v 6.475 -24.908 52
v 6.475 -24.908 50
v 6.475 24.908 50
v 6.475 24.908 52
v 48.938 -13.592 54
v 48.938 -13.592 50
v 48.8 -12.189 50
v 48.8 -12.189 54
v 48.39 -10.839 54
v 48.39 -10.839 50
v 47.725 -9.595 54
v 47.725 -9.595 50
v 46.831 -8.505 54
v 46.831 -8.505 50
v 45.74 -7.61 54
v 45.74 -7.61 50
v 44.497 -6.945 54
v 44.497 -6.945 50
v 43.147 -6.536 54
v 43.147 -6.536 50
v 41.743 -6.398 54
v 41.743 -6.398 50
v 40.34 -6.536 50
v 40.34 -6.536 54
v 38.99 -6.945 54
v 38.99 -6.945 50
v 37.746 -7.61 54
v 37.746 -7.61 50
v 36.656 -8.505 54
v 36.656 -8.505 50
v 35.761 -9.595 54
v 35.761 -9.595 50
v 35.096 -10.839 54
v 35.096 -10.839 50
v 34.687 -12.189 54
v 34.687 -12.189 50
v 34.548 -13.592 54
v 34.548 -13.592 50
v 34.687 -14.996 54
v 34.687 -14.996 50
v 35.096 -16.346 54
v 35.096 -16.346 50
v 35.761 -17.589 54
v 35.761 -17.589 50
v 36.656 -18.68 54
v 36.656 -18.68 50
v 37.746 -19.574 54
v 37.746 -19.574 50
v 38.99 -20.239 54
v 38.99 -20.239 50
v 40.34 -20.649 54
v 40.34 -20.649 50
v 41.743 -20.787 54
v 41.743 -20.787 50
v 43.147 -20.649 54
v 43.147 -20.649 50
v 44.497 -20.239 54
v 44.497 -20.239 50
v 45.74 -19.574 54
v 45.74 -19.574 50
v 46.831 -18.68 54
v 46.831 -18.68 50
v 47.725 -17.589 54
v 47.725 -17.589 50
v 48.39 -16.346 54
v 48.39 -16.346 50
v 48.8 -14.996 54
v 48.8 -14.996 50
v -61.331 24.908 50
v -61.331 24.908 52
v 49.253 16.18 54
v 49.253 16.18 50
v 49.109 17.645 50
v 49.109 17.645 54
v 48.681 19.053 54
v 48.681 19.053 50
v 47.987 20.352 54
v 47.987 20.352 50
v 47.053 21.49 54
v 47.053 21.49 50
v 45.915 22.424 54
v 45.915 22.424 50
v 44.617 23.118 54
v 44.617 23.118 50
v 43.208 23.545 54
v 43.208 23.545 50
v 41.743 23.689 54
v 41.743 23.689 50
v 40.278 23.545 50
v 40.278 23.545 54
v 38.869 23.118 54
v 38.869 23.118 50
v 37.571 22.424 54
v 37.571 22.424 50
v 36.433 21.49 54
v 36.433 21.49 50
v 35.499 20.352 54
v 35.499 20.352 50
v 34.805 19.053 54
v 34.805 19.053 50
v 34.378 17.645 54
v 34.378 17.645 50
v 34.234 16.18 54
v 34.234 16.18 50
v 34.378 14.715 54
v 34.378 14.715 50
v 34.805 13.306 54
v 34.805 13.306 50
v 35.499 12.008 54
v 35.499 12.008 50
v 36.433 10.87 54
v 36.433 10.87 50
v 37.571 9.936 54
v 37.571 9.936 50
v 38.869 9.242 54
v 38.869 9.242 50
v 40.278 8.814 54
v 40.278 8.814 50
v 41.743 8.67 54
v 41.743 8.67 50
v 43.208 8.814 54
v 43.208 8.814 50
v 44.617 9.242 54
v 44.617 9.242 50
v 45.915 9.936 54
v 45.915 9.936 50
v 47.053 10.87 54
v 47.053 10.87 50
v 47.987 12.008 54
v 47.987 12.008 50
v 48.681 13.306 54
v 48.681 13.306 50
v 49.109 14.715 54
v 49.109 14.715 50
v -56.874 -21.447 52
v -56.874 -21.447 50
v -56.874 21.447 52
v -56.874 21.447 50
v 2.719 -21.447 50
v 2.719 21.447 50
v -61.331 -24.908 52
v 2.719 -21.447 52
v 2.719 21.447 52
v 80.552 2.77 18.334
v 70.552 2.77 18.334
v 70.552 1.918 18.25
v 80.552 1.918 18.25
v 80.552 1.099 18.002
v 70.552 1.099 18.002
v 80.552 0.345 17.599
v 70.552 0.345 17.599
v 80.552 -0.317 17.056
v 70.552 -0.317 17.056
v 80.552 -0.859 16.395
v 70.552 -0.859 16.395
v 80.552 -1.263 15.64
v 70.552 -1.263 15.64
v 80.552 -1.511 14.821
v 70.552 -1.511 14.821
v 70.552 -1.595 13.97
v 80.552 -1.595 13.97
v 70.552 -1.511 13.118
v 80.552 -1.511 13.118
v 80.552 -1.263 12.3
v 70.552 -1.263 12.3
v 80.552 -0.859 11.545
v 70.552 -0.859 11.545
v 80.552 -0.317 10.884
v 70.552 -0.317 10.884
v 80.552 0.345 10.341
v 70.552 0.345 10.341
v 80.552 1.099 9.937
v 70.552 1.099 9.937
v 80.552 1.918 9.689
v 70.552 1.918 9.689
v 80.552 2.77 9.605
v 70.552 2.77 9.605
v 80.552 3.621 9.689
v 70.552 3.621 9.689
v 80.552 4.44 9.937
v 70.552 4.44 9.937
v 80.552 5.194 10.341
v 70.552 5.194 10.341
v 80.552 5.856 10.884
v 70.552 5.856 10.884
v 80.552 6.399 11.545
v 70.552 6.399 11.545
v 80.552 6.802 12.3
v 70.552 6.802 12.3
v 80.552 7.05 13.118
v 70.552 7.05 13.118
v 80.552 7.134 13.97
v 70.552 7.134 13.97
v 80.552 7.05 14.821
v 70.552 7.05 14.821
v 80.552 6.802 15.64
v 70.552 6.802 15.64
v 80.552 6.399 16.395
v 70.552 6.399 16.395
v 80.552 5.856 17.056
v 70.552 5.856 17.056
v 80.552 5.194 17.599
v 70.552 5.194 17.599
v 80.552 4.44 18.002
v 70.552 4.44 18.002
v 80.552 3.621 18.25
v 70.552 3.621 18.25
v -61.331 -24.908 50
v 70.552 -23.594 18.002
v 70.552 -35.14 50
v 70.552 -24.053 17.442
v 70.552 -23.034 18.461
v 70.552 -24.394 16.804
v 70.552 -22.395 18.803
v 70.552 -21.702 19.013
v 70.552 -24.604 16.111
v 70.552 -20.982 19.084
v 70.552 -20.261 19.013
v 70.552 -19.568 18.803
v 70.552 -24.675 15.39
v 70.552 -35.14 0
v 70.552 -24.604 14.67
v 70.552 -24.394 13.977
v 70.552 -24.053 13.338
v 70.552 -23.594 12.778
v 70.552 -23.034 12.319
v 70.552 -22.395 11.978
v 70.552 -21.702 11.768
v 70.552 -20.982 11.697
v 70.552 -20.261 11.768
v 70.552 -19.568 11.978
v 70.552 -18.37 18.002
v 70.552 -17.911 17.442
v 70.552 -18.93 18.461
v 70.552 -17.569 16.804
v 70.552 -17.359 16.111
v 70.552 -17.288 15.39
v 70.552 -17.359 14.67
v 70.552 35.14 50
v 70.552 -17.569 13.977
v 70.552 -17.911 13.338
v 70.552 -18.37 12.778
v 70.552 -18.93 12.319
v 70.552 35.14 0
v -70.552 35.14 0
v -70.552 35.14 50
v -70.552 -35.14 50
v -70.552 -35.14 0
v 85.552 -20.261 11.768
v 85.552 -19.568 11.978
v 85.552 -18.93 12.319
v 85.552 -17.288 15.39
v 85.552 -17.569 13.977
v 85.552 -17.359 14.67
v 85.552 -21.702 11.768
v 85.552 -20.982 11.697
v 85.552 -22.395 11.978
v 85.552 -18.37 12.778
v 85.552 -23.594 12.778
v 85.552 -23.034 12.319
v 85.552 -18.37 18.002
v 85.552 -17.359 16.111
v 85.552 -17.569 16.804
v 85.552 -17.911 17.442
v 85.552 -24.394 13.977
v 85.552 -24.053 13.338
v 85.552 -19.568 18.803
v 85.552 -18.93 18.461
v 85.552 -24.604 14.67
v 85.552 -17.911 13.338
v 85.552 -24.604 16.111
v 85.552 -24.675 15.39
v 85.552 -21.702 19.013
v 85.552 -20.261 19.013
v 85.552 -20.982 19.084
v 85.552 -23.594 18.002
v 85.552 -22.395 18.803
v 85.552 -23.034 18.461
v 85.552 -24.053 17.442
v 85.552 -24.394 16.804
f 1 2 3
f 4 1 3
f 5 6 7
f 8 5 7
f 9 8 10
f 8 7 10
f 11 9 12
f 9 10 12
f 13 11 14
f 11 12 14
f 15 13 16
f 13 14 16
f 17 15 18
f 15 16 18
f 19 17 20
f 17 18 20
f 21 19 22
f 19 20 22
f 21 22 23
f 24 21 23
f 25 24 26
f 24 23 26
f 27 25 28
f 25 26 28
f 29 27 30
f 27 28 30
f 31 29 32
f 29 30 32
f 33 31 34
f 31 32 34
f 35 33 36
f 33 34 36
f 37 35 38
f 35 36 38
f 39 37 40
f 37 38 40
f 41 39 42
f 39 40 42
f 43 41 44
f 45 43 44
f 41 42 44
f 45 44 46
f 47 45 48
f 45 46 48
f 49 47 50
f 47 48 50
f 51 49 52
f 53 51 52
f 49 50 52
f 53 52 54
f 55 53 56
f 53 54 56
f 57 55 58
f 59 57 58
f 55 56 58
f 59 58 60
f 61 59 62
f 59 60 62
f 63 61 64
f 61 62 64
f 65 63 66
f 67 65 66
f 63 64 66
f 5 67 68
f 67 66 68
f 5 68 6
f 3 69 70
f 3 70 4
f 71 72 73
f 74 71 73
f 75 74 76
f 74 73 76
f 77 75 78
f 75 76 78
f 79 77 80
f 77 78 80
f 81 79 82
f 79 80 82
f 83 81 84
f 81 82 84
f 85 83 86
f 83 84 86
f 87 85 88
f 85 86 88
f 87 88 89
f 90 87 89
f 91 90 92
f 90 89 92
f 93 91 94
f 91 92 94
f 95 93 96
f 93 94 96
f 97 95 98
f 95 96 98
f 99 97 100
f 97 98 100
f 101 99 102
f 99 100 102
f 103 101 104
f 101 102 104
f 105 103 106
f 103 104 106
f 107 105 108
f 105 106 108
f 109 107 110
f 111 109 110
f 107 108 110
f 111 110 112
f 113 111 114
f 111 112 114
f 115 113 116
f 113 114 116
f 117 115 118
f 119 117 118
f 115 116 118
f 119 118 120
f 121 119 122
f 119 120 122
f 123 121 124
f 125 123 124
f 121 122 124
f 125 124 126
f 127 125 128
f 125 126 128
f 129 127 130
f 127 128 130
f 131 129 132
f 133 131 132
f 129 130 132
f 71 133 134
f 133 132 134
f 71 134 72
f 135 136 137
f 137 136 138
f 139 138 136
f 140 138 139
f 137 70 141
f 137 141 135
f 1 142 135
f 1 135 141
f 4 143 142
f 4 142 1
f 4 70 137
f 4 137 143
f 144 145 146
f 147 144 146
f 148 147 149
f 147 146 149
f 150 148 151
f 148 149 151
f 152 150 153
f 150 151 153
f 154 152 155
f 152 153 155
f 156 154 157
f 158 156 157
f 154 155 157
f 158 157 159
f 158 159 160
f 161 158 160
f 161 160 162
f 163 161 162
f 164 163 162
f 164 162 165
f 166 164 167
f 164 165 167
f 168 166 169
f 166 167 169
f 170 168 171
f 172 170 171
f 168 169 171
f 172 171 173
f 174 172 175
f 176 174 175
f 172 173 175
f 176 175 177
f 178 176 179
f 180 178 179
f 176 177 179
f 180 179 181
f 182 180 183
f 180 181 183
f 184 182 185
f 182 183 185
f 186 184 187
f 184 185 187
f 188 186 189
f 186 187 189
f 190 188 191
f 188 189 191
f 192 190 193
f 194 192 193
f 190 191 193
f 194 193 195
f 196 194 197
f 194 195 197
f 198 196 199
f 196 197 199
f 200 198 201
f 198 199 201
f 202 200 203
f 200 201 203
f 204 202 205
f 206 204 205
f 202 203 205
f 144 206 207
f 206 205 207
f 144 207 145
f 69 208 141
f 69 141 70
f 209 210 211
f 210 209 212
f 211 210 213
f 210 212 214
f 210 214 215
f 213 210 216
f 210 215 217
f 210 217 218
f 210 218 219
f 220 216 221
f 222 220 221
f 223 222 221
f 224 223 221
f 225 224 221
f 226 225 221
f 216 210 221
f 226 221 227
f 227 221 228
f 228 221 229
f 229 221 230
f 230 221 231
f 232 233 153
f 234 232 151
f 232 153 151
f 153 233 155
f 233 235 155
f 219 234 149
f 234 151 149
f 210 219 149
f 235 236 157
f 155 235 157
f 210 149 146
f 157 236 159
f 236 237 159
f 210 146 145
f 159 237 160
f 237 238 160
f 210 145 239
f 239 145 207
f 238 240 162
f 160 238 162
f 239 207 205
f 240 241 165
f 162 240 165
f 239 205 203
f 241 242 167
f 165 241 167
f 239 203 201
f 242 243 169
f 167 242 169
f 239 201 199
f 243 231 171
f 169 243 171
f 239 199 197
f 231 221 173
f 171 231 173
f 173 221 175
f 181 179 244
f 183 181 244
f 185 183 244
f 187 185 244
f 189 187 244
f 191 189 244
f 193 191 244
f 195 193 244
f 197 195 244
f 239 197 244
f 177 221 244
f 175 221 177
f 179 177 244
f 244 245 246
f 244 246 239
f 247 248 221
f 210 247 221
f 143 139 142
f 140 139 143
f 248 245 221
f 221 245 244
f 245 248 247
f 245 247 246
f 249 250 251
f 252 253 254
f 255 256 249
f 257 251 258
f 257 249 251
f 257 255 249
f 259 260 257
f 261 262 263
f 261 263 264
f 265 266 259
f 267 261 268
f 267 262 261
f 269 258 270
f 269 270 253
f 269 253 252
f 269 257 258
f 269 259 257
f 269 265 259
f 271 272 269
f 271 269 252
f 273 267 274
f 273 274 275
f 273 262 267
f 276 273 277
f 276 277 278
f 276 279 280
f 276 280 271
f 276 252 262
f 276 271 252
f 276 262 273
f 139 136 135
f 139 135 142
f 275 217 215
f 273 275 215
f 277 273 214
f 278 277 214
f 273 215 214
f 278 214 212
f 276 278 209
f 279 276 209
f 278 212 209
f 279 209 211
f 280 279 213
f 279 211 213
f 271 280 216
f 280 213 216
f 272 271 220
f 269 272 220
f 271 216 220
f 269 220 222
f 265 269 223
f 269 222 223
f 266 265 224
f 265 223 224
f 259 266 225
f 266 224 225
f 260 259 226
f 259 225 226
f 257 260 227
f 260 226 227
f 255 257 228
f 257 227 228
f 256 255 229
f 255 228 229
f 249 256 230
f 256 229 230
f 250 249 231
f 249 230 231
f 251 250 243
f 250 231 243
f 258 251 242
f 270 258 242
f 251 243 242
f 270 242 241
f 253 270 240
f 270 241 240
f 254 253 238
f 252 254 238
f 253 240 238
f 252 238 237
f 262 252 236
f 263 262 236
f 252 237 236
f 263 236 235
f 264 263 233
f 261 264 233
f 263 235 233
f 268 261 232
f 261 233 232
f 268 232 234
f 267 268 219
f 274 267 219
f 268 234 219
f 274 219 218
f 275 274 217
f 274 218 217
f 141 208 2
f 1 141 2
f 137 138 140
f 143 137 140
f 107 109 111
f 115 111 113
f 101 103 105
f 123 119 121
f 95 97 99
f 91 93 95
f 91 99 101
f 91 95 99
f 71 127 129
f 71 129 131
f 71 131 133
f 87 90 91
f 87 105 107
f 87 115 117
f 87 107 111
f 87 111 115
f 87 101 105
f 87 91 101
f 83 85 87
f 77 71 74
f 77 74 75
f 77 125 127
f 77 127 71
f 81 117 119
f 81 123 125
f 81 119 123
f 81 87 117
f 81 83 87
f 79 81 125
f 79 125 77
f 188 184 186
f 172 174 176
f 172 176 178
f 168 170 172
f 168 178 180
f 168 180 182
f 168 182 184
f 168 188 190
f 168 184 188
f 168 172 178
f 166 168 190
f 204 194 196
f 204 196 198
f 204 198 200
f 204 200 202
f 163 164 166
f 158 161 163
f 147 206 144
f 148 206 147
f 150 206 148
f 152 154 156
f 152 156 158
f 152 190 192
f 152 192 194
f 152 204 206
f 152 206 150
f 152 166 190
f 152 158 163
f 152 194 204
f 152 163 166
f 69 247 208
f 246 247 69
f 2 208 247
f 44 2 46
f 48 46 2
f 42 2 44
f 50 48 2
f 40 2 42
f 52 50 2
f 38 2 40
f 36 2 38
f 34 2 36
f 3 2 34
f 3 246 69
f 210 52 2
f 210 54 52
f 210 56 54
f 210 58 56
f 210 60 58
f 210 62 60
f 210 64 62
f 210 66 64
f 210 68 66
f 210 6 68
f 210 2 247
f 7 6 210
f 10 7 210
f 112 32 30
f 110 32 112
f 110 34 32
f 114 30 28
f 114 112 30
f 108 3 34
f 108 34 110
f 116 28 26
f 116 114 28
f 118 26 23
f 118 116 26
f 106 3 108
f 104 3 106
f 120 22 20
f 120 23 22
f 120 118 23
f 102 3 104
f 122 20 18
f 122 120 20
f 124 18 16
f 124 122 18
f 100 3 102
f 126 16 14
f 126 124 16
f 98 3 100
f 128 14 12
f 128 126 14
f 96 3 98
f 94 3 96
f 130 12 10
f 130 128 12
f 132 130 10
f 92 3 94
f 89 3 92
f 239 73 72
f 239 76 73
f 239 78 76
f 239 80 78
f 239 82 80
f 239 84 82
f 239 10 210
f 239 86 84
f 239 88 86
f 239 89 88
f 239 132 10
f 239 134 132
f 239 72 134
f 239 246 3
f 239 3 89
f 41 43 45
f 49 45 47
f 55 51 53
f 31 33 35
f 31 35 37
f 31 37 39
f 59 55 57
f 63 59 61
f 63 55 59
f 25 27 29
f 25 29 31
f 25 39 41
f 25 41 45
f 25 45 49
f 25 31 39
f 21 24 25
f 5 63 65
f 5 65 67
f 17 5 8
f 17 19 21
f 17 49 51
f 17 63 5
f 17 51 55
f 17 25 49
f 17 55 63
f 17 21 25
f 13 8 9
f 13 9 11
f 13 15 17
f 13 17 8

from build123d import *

# Parameters (mm, degrees)
SKETCH1_W           = 141.104496432
SKETCH1_H           = 70.279121138
BOSS_EXTRUDE1_DEPTH = 50
SKETCH2_W           = 67.805568122
SKETCH2_H           = 49.81527963
SKETCH2_W_2         = 59.592894194
SKETCH2_H_2         = 42.894286786
BOSS_EXTRUDE2_DEPTH = 2
SKETCH3_R           = 7.50966637
SKETCH3_R_2         = 7.194748193
BOSS_EXTRUDE3_DEPTH = 4
SKETCH4_R           = 4.364569168
BOSS_EXTRUDE4_DEPTH = 10
SKETCH5_R           = 3.693674176
BOSS_EXTRUDE5_DEPTH = 15


with BuildPart() as part:
    # Sketch1 → Boss-Extrude1 (new body)
    with BuildSketch(Plane.XY):
        Rectangle(SKETCH1_W, SKETCH1_H)
    extrude(amount=BOSS_EXTRUDE1_DEPTH)

    # Sketch2 → Boss-Extrude2 (add)
    with BuildSketch(Plane.XY.offset(50)):
        with Locations((-27.427958915, 0)):
            Rectangle(SKETCH2_W, SKETCH2_H)
        with Locations((-27.077866503, 0)):
            Rectangle(SKETCH2_W_2, SKETCH2_H_2, mode=Mode.SUBTRACT)
    extrude(amount=BOSS_EXTRUDE2_DEPTH)

    # Sketch3 → Boss-Extrude3 (add)
    with BuildSketch(Plane.XY.offset(50)):
        with Locations((41.743235824, 16.179657371)):
            Circle(SKETCH3_R)
        with Locations((41.743235824, -13.592283792)):
            Circle(SKETCH3_R_2)
    extrude(amount=BOSS_EXTRUDE3_DEPTH)

    # Sketch4 → Boss-Extrude4 (add)
    with BuildSketch(Plane(origin=(70.552248216, 0, 0), x_dir=(0, 0, -1), z_dir=(1, 0, 0))):
        with Locations(Location((-13.969787954, 2.76951533, 0), (0, 0, 180))):
            Circle(SKETCH4_R)
    extrude(amount=BOSS_EXTRUDE4_DEPTH)

    # Sketch5 → Boss-Extrude5 (add)
    with BuildSketch(Plane(origin=(70.552248216, 0, 0), x_dir=(0, 0, -1), z_dir=(1, 0, 0))):
        with Locations(Location((-15.390317834, -20.981701915, 0), (0, 0, 180))):
            Circle(SKETCH5_R)
    extrude(amount=BOSS_EXTRUDE5_DEPTH)


solid = part.part
